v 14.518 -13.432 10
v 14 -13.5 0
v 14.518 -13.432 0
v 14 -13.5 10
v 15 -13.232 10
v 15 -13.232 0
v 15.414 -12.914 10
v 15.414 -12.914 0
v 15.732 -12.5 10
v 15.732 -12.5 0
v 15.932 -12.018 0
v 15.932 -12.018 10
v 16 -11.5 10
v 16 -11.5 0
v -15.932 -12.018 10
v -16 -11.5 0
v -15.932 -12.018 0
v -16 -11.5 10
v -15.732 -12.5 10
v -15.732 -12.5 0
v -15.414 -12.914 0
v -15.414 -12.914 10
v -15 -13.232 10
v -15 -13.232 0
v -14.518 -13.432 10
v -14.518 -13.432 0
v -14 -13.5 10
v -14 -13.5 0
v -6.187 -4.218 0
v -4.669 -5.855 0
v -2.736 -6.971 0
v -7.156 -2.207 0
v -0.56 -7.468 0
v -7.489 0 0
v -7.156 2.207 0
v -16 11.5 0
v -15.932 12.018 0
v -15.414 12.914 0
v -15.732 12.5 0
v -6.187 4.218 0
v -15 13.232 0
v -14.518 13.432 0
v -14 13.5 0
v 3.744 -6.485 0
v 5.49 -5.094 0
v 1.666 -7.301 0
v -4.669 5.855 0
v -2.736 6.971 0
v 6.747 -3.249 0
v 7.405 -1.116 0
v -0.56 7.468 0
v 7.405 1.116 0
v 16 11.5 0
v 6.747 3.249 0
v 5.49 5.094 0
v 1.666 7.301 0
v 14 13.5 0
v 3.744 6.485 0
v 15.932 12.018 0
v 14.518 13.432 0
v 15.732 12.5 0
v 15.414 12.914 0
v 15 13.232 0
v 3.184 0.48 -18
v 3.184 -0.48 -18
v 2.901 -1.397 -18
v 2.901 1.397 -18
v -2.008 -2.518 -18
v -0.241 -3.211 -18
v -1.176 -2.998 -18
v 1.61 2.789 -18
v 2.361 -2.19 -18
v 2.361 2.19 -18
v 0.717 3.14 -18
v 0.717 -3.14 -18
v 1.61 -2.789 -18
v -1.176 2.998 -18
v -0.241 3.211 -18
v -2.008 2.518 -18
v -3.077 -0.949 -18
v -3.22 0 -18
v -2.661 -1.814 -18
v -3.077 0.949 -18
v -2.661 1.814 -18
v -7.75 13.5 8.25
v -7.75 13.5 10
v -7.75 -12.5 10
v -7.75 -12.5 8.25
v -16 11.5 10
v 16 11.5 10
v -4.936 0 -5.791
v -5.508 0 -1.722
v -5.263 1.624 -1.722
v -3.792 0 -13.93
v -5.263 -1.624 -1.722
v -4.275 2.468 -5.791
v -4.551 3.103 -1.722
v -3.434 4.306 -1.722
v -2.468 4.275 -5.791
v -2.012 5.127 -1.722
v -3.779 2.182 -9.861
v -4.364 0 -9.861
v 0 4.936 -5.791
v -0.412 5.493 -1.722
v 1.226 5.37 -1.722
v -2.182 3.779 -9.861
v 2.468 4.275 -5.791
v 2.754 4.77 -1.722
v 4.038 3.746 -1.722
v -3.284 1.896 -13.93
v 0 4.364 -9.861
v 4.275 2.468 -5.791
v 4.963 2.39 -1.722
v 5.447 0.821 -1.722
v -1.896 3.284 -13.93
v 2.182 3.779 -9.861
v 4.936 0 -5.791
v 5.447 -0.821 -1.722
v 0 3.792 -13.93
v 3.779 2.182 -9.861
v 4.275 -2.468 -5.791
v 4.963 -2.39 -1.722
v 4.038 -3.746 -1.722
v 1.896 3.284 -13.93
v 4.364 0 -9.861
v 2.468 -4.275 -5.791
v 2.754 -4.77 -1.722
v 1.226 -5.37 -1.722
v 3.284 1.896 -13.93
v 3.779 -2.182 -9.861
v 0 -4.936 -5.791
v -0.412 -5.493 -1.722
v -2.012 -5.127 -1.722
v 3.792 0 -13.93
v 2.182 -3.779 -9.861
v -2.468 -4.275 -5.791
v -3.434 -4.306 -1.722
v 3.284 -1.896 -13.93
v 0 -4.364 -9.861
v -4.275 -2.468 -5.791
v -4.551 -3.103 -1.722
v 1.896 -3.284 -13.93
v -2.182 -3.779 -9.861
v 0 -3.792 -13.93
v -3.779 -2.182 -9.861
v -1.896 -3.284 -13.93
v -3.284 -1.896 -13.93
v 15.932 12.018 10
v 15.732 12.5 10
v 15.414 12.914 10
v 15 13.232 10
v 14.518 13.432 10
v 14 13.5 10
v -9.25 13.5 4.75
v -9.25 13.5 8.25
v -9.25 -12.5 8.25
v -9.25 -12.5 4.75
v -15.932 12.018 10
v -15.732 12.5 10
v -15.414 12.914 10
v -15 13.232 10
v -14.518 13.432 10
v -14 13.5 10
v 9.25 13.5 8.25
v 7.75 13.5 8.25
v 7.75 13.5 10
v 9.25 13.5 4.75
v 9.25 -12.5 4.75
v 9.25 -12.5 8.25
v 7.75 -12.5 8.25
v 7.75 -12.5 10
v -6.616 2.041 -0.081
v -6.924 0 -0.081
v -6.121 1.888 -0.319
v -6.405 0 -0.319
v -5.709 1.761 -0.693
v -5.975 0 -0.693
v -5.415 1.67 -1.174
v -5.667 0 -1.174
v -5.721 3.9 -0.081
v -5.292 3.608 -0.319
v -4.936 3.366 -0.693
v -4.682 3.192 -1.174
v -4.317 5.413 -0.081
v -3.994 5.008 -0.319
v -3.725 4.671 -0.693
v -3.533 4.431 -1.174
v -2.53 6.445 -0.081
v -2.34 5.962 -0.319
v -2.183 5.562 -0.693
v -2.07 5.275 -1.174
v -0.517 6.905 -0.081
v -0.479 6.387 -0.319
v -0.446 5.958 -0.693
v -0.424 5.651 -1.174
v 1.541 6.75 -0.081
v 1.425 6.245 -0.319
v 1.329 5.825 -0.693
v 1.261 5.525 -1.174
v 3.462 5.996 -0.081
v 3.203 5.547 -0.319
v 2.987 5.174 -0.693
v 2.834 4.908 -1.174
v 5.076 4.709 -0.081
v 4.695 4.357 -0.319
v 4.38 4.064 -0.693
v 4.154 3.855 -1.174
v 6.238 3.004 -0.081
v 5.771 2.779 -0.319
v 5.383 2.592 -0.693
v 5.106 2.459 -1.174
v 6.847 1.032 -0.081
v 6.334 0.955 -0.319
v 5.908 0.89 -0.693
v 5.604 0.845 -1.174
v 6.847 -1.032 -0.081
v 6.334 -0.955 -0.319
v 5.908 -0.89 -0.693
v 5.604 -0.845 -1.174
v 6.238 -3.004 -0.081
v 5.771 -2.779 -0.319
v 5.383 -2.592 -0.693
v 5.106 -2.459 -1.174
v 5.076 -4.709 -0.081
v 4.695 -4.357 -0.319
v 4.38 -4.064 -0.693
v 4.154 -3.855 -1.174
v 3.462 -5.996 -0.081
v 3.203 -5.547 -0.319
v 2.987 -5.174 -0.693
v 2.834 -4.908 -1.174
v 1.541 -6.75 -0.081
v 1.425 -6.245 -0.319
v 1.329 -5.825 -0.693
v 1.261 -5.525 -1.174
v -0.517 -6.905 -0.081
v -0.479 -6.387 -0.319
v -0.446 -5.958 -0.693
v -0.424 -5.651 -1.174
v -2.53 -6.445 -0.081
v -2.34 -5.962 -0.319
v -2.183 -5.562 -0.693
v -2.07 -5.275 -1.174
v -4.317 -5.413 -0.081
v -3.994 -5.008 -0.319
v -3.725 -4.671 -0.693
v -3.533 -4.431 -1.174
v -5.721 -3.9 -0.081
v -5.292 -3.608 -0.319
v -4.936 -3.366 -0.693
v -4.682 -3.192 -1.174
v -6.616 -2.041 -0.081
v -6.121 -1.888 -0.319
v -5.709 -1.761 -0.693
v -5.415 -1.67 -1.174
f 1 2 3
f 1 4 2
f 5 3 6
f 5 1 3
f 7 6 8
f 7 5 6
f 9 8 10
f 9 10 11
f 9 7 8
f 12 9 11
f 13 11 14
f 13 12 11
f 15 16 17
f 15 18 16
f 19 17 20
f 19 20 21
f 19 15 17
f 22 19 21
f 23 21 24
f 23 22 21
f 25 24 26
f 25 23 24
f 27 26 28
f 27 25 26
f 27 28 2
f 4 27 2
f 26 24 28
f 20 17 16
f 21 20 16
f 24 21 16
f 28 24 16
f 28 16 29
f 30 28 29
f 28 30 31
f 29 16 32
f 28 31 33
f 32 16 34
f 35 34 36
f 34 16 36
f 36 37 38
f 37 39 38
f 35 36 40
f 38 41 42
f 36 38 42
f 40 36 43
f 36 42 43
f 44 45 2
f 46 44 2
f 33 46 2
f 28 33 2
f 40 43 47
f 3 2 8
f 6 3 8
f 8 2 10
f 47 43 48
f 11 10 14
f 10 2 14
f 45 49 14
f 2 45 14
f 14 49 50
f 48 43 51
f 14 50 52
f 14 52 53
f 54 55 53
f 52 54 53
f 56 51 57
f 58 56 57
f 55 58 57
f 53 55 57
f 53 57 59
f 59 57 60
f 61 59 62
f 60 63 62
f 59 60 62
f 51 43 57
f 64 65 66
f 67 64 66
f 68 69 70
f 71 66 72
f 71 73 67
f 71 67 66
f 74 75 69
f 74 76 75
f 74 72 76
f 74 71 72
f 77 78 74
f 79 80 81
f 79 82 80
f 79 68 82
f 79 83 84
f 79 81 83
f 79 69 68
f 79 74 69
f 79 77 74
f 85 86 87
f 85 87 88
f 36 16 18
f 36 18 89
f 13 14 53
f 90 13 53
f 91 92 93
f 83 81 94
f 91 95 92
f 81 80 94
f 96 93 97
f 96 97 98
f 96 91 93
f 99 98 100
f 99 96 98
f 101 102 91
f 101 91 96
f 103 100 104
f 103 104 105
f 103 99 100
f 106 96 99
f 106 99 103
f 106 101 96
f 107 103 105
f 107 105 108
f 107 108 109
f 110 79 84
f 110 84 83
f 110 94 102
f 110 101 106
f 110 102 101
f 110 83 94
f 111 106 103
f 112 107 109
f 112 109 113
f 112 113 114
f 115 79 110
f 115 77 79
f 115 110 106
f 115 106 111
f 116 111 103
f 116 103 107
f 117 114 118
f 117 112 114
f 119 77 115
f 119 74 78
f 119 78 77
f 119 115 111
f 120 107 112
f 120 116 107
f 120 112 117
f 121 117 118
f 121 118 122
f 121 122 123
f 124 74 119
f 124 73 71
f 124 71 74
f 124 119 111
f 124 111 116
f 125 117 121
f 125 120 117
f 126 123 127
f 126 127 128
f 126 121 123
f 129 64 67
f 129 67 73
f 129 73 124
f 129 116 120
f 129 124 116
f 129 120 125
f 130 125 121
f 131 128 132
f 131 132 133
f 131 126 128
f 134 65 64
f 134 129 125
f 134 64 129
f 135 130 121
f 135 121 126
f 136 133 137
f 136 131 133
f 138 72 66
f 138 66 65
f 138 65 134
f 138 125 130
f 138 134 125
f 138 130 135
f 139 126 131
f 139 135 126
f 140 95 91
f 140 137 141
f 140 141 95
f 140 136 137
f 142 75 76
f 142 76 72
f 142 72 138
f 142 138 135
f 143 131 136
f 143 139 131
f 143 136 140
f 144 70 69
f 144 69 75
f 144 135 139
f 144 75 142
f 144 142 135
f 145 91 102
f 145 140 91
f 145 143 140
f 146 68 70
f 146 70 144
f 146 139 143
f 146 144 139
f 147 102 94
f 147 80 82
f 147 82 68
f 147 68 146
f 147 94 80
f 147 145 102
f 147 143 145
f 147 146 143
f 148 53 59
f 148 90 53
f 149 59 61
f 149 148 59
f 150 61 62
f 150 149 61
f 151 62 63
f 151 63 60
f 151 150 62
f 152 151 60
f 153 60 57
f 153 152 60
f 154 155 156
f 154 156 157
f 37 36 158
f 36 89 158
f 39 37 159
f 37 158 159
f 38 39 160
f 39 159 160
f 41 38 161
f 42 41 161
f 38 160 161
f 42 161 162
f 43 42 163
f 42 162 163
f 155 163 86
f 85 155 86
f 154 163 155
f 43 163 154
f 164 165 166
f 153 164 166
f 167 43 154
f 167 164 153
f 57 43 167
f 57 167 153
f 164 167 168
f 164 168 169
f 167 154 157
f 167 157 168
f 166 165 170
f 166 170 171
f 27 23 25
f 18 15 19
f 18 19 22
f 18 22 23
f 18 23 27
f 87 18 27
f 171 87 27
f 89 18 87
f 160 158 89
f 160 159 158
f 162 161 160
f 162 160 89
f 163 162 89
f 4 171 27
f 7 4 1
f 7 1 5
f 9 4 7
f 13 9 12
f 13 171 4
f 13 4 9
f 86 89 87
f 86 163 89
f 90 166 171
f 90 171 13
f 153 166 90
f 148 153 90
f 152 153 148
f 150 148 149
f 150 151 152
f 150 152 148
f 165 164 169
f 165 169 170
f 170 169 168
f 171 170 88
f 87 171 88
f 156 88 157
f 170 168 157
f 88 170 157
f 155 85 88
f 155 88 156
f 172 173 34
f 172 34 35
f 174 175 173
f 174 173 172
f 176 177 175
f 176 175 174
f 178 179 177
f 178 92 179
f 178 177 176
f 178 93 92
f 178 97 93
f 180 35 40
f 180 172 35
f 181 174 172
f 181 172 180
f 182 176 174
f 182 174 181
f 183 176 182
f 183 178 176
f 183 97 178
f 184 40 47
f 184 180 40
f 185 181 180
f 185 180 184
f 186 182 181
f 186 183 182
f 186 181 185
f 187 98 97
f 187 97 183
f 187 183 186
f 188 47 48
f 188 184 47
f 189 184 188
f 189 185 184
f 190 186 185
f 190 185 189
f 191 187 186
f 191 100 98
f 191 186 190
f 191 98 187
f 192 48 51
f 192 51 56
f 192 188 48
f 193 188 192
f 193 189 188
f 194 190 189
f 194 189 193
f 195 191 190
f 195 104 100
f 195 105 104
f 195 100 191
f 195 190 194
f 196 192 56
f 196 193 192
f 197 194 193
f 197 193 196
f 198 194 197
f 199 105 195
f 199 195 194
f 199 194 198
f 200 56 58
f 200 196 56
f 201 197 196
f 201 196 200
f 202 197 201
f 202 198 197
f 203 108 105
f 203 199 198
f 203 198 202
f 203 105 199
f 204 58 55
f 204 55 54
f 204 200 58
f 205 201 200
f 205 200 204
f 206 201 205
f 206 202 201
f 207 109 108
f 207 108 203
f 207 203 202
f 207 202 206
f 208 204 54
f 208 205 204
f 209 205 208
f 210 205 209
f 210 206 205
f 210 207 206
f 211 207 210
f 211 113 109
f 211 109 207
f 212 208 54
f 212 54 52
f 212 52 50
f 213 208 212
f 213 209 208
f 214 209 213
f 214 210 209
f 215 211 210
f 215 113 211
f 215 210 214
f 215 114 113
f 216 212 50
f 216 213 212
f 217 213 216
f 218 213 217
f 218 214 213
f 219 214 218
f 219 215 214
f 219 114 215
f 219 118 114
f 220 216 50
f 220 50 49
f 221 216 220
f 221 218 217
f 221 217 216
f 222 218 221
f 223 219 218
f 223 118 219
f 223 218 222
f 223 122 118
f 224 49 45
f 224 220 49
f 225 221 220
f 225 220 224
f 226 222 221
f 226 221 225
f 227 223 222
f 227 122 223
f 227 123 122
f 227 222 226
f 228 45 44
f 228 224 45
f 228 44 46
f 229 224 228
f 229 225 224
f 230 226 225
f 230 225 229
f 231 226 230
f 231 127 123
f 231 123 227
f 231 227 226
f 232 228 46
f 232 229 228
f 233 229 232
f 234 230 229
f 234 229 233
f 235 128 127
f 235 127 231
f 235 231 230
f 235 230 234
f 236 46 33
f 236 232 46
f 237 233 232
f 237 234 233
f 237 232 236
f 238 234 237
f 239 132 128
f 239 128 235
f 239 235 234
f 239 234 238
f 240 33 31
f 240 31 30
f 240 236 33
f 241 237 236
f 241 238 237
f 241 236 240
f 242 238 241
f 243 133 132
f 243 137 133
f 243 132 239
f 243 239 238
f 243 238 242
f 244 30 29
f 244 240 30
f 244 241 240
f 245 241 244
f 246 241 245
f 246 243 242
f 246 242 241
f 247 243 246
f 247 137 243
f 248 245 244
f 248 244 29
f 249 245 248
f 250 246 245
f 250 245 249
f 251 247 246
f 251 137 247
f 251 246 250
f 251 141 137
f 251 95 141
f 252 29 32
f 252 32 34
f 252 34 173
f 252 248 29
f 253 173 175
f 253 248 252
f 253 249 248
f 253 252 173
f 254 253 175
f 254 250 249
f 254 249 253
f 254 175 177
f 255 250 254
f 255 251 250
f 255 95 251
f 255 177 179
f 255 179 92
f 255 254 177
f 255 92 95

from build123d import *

# Parameters (mm, degrees)
SKETCH1_W           = 32
SKETCH1_H           = 27
BOSS_EXTRUDE1_DEPTH = 10
FILLET1_R           = 2
CUT_EXTRUDE4_DEPTH  = 26
SKETCH4_R           = 5.75
BOSS_EXTRUDE2_DEPTH = 18
BOSS_EXTRUDE2_TAPER = 8
FILLET2_R           = 2


with BuildPart() as part:
    # Sketch1 → Boss-Extrude1 (new body)
    with BuildSketch(Plane.XY):
        Rectangle(SKETCH1_W, SKETCH1_H)
    extrude(amount=BOSS_EXTRUDE1_DEPTH)

    # Fillet1
    fillet1_edges = [part.edges().sort_by_distance(p)[0] for p in [
        (-16, -13.5, 5),
        (16, -13.5, 5),
        (16, 13.5, 5),
        (-16, 13.5, 5),
    ]]
    fillet(fillet1_edges, radius=FILLET1_R)

    # Sketch2 → Cut-Extrude4 (cut)
    with BuildSketch(Plane(origin=(0, 13.5, 0), x_dir=(1, 0, 0), z_dir=(0, 1, 0))):
        Polygon((-7.75, -10), (-7.75, -8.25), (-9.25, -8.25), (-9.25, -4.75), (9.25, -4.75), (9.25, -8.25), (7.75, -8.25), (7.75, -10), align=None)
    extrude(amount=-CUT_EXTRUDE4_DEPTH, mode=Mode.SUBTRACT)

    # Sketch4 → Boss-Extrude2 (add)
    with BuildSketch(Plane(origin=(0, 0, 0), x_dir=(-1, 0, 0), z_dir=(0, 0, -1))):
        Circle(SKETCH4_R)
    extrude(amount=BOSS_EXTRUDE2_DEPTH, taper=BOSS_EXTRUDE2_TAPER)

    # Fillet2
    fillet2_edges = [part.edges().sort_by_distance(p)[0] for p in [
        (5.75, 0, 0),
    ]]
    fillet(fillet2_edges, radius=FILLET2_R)


solid = part.part
